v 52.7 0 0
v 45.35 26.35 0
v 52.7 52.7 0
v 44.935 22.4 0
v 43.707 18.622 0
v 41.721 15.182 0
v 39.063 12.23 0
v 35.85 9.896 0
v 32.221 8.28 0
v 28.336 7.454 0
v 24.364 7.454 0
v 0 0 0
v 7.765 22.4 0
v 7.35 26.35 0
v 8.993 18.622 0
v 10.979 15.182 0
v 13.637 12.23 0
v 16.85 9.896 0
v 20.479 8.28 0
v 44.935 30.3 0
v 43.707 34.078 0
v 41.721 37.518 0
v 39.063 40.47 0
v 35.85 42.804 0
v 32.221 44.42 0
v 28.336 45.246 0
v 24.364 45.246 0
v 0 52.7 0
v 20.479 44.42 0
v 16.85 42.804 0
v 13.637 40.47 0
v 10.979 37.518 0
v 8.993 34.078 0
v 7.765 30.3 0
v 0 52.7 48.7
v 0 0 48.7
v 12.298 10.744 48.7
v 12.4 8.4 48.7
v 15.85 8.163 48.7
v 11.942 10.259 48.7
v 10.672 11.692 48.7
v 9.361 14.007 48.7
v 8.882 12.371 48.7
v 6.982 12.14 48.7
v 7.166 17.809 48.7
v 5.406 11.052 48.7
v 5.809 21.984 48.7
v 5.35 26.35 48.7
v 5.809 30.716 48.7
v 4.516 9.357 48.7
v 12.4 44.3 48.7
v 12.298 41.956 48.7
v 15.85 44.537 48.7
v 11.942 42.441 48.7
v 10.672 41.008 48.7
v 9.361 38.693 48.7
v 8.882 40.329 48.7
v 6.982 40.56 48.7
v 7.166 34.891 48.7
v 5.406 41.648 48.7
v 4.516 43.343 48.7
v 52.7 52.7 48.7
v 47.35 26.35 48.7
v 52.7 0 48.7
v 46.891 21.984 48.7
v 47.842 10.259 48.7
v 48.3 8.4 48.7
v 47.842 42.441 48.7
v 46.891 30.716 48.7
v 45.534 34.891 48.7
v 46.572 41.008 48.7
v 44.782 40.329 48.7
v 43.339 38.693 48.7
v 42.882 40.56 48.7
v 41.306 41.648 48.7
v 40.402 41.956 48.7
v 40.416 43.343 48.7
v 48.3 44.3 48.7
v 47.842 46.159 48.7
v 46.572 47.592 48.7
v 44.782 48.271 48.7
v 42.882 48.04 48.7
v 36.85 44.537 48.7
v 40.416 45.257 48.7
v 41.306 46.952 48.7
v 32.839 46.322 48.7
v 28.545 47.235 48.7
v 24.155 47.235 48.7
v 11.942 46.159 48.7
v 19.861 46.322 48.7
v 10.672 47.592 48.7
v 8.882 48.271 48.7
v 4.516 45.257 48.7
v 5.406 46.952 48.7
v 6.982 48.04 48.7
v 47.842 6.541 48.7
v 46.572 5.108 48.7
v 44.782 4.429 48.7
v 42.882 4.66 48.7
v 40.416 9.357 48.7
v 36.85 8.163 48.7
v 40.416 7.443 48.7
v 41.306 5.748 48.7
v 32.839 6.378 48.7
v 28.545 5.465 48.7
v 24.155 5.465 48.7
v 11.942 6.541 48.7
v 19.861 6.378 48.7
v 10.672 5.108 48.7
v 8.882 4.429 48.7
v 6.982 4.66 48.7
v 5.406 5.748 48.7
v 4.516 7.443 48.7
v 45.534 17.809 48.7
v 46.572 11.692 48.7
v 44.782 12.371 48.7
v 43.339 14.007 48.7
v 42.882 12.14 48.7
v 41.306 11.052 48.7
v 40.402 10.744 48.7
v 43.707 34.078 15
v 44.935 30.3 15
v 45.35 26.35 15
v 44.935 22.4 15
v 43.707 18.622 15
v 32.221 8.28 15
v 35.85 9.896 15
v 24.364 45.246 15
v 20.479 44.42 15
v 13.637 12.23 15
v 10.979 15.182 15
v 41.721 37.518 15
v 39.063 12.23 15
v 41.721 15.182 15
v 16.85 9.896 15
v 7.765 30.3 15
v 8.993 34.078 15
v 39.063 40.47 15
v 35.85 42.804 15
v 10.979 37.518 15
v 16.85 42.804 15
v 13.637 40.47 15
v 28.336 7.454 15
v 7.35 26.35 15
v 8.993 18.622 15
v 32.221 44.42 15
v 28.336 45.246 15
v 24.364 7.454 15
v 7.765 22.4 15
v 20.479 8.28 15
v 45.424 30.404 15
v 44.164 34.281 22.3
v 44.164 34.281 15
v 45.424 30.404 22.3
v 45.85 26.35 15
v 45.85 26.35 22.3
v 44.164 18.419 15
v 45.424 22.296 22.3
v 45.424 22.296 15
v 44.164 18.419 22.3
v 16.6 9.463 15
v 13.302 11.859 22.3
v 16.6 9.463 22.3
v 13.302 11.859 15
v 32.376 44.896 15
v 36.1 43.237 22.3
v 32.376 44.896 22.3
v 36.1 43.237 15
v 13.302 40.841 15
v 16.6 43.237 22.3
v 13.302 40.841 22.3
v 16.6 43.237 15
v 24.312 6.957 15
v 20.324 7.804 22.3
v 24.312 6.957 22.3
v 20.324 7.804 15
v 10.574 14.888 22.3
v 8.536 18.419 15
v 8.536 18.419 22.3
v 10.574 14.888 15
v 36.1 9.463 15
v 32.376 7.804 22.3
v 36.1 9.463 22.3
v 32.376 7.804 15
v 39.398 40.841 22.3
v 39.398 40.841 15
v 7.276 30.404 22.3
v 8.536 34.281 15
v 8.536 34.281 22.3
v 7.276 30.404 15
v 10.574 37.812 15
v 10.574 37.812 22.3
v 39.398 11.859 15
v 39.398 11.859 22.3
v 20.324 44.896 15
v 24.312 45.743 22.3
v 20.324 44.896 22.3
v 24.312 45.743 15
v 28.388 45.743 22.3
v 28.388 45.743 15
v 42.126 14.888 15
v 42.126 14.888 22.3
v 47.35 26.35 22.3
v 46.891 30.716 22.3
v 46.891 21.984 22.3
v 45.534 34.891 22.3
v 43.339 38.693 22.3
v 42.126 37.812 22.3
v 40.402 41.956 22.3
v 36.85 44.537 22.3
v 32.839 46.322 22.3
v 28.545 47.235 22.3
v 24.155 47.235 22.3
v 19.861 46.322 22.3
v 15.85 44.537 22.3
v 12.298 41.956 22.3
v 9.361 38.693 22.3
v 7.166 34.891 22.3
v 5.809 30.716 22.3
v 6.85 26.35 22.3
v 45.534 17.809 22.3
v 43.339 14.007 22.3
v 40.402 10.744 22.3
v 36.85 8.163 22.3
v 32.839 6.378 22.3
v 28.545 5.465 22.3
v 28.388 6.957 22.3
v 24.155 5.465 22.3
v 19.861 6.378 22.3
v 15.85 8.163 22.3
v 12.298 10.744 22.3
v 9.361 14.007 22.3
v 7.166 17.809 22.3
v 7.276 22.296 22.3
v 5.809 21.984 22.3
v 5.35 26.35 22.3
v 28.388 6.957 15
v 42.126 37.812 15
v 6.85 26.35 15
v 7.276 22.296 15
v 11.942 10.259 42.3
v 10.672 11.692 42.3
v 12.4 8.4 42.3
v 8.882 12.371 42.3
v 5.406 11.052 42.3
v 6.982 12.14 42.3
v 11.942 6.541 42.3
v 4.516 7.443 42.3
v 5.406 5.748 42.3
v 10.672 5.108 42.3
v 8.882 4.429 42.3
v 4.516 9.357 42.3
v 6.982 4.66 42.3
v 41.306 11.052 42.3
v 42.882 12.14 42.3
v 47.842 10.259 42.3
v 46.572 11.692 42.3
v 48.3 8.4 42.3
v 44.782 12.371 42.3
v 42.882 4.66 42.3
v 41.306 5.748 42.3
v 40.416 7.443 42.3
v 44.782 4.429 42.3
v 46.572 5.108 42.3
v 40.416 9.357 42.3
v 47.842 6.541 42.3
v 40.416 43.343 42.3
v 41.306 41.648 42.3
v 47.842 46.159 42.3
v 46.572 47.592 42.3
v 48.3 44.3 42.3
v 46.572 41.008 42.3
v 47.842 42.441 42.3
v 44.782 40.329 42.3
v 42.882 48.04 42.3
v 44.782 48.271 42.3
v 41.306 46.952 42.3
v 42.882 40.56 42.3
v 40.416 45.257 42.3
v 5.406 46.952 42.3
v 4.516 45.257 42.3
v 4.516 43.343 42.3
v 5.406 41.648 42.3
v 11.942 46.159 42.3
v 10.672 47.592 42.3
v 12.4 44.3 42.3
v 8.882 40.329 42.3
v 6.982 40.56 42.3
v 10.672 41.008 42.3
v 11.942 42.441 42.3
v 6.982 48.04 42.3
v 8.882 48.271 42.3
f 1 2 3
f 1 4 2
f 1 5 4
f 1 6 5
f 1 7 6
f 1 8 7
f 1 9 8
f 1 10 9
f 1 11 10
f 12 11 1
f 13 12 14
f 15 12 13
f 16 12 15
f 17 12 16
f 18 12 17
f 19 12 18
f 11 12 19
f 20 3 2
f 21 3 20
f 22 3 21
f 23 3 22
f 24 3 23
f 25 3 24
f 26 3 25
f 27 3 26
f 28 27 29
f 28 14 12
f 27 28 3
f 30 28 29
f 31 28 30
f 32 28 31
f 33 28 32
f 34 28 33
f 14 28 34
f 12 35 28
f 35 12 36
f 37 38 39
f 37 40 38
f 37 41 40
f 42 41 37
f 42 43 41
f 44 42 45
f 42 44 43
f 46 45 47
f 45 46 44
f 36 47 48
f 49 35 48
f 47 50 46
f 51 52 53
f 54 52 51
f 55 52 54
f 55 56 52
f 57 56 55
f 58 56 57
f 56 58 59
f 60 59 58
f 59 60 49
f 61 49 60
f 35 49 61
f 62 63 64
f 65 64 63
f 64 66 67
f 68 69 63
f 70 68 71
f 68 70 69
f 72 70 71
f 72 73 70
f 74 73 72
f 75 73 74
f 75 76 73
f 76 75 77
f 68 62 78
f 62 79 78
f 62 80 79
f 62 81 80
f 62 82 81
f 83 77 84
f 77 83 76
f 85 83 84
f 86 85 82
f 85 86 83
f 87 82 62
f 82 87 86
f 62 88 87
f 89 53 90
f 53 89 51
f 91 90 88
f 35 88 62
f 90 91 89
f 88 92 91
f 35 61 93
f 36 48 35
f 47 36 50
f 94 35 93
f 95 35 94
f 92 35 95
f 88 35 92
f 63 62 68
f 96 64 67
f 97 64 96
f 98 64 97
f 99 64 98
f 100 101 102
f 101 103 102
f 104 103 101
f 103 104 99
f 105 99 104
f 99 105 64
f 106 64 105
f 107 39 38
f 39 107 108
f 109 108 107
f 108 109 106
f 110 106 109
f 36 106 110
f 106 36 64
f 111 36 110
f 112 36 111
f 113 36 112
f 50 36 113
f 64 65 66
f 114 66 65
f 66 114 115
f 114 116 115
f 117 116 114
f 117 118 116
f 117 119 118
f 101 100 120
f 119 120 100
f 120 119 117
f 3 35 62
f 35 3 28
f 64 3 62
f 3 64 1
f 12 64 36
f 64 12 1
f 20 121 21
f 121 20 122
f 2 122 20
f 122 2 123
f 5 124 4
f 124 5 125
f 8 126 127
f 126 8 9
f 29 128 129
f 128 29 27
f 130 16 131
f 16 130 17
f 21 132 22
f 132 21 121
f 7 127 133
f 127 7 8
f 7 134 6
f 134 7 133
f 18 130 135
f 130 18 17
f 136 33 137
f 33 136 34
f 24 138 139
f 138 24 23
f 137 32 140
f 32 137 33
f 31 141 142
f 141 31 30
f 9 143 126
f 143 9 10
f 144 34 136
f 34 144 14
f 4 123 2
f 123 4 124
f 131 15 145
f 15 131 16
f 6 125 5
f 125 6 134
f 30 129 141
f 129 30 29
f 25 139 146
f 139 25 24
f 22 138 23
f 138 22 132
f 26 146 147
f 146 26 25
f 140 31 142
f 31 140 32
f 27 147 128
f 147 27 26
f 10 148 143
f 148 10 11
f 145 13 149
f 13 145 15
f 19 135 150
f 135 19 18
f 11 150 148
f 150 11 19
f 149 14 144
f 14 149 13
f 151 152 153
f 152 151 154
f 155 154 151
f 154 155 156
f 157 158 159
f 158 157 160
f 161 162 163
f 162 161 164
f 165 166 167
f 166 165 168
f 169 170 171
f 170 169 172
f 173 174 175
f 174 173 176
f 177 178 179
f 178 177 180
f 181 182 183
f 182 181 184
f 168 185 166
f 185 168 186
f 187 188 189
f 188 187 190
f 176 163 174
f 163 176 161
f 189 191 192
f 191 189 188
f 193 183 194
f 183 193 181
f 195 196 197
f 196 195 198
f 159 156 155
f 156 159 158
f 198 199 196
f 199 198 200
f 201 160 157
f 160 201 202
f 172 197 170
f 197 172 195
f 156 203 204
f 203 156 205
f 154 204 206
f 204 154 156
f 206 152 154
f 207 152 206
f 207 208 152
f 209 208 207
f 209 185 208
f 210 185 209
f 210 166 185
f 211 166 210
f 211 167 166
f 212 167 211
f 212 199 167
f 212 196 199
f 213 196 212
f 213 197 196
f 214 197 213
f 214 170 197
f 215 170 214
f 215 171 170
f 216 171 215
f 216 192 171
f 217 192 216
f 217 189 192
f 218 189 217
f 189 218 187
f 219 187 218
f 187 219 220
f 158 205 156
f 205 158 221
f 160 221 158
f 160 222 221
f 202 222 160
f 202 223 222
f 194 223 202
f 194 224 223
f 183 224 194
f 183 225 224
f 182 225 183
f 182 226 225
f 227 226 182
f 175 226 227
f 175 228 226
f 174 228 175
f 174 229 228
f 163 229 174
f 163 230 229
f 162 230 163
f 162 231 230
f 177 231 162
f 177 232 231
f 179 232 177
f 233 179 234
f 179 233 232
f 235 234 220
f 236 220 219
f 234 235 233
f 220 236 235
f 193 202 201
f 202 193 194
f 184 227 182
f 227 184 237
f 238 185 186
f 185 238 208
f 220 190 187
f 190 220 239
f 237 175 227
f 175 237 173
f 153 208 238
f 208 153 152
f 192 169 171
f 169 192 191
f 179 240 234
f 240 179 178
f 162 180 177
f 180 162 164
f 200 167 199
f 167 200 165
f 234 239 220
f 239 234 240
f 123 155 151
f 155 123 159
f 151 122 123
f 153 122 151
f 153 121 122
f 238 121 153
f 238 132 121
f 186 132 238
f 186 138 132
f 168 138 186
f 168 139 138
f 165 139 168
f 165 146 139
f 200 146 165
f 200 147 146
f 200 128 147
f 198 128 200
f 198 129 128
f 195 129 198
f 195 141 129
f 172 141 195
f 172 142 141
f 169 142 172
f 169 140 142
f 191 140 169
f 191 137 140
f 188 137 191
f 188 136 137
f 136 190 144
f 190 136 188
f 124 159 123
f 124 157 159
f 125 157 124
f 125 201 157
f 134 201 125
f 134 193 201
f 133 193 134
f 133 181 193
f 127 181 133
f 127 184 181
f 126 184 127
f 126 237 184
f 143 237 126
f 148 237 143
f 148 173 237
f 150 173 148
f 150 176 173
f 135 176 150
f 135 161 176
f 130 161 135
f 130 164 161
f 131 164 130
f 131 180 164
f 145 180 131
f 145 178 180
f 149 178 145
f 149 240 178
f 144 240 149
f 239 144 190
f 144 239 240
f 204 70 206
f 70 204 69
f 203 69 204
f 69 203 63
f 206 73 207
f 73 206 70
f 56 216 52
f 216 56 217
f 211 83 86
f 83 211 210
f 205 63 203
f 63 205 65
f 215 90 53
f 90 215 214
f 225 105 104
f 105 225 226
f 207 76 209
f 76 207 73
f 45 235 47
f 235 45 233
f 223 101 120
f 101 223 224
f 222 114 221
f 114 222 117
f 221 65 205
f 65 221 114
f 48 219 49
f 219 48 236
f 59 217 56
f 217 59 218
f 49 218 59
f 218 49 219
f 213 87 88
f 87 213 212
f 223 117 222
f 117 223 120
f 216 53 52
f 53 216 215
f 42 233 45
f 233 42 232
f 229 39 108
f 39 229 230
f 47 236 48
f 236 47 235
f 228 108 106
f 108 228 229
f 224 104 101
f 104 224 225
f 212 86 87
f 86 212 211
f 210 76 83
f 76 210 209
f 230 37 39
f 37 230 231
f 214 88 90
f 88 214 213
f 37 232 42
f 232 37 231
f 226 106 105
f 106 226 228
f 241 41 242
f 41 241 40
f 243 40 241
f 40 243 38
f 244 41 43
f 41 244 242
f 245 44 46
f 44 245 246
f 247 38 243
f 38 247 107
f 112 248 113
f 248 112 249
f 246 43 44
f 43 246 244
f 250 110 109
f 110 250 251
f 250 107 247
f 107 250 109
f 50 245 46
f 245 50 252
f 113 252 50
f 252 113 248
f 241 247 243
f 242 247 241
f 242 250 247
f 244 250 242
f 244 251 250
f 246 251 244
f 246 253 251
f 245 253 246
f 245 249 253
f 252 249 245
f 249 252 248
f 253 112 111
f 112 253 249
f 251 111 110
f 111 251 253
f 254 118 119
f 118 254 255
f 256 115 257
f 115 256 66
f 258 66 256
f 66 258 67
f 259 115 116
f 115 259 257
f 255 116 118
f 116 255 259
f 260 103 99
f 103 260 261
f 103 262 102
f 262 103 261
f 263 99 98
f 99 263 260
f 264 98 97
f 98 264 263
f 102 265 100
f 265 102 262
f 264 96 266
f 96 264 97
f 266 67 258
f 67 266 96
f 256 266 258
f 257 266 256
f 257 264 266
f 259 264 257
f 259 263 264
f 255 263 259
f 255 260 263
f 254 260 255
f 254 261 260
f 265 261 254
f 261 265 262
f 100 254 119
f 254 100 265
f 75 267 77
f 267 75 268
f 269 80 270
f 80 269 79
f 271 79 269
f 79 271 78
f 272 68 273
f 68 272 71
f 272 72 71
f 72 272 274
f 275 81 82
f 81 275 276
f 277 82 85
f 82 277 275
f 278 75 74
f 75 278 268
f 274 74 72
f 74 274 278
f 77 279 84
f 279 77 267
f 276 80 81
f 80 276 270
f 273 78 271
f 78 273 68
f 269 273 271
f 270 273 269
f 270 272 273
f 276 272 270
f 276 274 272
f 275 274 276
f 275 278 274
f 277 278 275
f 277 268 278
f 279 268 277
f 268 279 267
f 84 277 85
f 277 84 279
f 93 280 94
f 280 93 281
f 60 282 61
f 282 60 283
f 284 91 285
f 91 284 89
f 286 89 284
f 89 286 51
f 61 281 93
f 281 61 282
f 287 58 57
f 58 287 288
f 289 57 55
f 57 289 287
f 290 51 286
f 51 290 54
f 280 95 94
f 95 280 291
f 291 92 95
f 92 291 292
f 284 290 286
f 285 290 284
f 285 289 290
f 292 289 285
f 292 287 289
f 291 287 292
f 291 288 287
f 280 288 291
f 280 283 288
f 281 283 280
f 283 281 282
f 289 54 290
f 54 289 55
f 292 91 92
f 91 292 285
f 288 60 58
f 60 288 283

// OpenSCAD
  difference(){
  difference(){
  difference(){
  difference(){
  difference(){
  difference(){
  difference(){ 
   linear_extrude(height = 48.7)
            square([52.7, 52.7]);
   
   translate([26.35,026.35,0])
      cylinder(d=38, h=48.7);
  }
            
   translate([26.35,026.35,15])
      cylinder(d=39, h=7.3);
  }
  
  translate([26.35,026.35,22.3])
      cylinder(d=42, h=26.4);
  }
  translate([8.4,8.4,42.3])
      cylinder(d=8, h=6.4);
  }
  translate([44.3,8.4,42.3])
      cylinder(d=8, h=6.4);
  }
  translate([44.3,44.3,42.3])
      cylinder(d=8, h=6.4);
  }
  translate([8.4,44.3,42.3])
      cylinder(d=8, h=6.4);
  }
  
      
